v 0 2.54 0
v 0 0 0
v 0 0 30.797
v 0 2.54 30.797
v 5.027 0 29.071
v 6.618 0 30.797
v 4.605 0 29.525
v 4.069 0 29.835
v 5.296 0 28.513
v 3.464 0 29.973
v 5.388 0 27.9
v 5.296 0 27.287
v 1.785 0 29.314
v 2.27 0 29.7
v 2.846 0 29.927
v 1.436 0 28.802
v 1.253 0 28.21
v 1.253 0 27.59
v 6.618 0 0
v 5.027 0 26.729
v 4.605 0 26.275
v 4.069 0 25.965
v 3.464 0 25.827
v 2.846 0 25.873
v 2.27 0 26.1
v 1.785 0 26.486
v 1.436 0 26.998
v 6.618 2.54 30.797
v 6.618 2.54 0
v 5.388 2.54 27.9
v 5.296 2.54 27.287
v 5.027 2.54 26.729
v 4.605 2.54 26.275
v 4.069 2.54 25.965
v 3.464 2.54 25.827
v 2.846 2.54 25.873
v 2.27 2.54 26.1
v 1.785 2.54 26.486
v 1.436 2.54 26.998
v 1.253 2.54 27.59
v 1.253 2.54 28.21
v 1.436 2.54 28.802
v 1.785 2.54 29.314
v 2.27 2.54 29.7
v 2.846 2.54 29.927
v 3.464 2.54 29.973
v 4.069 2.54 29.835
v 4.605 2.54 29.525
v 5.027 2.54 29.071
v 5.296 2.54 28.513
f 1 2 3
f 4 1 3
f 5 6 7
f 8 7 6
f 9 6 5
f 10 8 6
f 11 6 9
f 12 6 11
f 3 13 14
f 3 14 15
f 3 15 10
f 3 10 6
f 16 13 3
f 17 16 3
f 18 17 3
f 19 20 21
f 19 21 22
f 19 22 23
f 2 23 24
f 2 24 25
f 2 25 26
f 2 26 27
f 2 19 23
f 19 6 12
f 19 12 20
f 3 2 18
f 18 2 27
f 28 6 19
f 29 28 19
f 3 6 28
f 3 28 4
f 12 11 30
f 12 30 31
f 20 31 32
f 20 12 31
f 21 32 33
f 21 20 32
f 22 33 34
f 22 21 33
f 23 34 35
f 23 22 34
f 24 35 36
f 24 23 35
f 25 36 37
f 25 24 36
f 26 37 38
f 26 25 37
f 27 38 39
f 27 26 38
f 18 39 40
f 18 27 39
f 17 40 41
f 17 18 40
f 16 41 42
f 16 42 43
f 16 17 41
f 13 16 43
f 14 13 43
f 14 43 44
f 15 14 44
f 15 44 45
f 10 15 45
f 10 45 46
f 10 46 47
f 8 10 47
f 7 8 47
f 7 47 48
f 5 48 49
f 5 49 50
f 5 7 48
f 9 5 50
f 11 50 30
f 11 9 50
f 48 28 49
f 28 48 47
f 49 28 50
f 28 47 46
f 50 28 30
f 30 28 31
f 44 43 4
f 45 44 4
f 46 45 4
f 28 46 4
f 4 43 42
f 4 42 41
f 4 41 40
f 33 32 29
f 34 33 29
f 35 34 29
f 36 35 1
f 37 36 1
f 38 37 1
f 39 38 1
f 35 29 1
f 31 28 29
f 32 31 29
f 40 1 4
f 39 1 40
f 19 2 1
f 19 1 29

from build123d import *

# Parameters (mm, degrees)
SKETCH1_R           = 2.07899
BOSS_EXTRUDE1_DEPTH = 2.54


with BuildPart() as part:
    # Sketch1 → Boss-Extrude1 (new body)
    with BuildSketch(Plane(origin=(0, 0, 0), x_dir=(1, 0, 0), z_dir=(0, 1, 0))):
        Polygon((0, 0), (6.618, 0), (6.618, -25.450703704), (6.618, -30.796997366), (0, -30.796997366), (0, -27.9), (0, -25.450703704), align=None)
        with Locations((3.309, -27.9)):
            Circle(SKETCH1_R, mode=Mode.SUBTRACT)
    extrude(amount=BOSS_EXTRUDE1_DEPTH)


solid = part.part
